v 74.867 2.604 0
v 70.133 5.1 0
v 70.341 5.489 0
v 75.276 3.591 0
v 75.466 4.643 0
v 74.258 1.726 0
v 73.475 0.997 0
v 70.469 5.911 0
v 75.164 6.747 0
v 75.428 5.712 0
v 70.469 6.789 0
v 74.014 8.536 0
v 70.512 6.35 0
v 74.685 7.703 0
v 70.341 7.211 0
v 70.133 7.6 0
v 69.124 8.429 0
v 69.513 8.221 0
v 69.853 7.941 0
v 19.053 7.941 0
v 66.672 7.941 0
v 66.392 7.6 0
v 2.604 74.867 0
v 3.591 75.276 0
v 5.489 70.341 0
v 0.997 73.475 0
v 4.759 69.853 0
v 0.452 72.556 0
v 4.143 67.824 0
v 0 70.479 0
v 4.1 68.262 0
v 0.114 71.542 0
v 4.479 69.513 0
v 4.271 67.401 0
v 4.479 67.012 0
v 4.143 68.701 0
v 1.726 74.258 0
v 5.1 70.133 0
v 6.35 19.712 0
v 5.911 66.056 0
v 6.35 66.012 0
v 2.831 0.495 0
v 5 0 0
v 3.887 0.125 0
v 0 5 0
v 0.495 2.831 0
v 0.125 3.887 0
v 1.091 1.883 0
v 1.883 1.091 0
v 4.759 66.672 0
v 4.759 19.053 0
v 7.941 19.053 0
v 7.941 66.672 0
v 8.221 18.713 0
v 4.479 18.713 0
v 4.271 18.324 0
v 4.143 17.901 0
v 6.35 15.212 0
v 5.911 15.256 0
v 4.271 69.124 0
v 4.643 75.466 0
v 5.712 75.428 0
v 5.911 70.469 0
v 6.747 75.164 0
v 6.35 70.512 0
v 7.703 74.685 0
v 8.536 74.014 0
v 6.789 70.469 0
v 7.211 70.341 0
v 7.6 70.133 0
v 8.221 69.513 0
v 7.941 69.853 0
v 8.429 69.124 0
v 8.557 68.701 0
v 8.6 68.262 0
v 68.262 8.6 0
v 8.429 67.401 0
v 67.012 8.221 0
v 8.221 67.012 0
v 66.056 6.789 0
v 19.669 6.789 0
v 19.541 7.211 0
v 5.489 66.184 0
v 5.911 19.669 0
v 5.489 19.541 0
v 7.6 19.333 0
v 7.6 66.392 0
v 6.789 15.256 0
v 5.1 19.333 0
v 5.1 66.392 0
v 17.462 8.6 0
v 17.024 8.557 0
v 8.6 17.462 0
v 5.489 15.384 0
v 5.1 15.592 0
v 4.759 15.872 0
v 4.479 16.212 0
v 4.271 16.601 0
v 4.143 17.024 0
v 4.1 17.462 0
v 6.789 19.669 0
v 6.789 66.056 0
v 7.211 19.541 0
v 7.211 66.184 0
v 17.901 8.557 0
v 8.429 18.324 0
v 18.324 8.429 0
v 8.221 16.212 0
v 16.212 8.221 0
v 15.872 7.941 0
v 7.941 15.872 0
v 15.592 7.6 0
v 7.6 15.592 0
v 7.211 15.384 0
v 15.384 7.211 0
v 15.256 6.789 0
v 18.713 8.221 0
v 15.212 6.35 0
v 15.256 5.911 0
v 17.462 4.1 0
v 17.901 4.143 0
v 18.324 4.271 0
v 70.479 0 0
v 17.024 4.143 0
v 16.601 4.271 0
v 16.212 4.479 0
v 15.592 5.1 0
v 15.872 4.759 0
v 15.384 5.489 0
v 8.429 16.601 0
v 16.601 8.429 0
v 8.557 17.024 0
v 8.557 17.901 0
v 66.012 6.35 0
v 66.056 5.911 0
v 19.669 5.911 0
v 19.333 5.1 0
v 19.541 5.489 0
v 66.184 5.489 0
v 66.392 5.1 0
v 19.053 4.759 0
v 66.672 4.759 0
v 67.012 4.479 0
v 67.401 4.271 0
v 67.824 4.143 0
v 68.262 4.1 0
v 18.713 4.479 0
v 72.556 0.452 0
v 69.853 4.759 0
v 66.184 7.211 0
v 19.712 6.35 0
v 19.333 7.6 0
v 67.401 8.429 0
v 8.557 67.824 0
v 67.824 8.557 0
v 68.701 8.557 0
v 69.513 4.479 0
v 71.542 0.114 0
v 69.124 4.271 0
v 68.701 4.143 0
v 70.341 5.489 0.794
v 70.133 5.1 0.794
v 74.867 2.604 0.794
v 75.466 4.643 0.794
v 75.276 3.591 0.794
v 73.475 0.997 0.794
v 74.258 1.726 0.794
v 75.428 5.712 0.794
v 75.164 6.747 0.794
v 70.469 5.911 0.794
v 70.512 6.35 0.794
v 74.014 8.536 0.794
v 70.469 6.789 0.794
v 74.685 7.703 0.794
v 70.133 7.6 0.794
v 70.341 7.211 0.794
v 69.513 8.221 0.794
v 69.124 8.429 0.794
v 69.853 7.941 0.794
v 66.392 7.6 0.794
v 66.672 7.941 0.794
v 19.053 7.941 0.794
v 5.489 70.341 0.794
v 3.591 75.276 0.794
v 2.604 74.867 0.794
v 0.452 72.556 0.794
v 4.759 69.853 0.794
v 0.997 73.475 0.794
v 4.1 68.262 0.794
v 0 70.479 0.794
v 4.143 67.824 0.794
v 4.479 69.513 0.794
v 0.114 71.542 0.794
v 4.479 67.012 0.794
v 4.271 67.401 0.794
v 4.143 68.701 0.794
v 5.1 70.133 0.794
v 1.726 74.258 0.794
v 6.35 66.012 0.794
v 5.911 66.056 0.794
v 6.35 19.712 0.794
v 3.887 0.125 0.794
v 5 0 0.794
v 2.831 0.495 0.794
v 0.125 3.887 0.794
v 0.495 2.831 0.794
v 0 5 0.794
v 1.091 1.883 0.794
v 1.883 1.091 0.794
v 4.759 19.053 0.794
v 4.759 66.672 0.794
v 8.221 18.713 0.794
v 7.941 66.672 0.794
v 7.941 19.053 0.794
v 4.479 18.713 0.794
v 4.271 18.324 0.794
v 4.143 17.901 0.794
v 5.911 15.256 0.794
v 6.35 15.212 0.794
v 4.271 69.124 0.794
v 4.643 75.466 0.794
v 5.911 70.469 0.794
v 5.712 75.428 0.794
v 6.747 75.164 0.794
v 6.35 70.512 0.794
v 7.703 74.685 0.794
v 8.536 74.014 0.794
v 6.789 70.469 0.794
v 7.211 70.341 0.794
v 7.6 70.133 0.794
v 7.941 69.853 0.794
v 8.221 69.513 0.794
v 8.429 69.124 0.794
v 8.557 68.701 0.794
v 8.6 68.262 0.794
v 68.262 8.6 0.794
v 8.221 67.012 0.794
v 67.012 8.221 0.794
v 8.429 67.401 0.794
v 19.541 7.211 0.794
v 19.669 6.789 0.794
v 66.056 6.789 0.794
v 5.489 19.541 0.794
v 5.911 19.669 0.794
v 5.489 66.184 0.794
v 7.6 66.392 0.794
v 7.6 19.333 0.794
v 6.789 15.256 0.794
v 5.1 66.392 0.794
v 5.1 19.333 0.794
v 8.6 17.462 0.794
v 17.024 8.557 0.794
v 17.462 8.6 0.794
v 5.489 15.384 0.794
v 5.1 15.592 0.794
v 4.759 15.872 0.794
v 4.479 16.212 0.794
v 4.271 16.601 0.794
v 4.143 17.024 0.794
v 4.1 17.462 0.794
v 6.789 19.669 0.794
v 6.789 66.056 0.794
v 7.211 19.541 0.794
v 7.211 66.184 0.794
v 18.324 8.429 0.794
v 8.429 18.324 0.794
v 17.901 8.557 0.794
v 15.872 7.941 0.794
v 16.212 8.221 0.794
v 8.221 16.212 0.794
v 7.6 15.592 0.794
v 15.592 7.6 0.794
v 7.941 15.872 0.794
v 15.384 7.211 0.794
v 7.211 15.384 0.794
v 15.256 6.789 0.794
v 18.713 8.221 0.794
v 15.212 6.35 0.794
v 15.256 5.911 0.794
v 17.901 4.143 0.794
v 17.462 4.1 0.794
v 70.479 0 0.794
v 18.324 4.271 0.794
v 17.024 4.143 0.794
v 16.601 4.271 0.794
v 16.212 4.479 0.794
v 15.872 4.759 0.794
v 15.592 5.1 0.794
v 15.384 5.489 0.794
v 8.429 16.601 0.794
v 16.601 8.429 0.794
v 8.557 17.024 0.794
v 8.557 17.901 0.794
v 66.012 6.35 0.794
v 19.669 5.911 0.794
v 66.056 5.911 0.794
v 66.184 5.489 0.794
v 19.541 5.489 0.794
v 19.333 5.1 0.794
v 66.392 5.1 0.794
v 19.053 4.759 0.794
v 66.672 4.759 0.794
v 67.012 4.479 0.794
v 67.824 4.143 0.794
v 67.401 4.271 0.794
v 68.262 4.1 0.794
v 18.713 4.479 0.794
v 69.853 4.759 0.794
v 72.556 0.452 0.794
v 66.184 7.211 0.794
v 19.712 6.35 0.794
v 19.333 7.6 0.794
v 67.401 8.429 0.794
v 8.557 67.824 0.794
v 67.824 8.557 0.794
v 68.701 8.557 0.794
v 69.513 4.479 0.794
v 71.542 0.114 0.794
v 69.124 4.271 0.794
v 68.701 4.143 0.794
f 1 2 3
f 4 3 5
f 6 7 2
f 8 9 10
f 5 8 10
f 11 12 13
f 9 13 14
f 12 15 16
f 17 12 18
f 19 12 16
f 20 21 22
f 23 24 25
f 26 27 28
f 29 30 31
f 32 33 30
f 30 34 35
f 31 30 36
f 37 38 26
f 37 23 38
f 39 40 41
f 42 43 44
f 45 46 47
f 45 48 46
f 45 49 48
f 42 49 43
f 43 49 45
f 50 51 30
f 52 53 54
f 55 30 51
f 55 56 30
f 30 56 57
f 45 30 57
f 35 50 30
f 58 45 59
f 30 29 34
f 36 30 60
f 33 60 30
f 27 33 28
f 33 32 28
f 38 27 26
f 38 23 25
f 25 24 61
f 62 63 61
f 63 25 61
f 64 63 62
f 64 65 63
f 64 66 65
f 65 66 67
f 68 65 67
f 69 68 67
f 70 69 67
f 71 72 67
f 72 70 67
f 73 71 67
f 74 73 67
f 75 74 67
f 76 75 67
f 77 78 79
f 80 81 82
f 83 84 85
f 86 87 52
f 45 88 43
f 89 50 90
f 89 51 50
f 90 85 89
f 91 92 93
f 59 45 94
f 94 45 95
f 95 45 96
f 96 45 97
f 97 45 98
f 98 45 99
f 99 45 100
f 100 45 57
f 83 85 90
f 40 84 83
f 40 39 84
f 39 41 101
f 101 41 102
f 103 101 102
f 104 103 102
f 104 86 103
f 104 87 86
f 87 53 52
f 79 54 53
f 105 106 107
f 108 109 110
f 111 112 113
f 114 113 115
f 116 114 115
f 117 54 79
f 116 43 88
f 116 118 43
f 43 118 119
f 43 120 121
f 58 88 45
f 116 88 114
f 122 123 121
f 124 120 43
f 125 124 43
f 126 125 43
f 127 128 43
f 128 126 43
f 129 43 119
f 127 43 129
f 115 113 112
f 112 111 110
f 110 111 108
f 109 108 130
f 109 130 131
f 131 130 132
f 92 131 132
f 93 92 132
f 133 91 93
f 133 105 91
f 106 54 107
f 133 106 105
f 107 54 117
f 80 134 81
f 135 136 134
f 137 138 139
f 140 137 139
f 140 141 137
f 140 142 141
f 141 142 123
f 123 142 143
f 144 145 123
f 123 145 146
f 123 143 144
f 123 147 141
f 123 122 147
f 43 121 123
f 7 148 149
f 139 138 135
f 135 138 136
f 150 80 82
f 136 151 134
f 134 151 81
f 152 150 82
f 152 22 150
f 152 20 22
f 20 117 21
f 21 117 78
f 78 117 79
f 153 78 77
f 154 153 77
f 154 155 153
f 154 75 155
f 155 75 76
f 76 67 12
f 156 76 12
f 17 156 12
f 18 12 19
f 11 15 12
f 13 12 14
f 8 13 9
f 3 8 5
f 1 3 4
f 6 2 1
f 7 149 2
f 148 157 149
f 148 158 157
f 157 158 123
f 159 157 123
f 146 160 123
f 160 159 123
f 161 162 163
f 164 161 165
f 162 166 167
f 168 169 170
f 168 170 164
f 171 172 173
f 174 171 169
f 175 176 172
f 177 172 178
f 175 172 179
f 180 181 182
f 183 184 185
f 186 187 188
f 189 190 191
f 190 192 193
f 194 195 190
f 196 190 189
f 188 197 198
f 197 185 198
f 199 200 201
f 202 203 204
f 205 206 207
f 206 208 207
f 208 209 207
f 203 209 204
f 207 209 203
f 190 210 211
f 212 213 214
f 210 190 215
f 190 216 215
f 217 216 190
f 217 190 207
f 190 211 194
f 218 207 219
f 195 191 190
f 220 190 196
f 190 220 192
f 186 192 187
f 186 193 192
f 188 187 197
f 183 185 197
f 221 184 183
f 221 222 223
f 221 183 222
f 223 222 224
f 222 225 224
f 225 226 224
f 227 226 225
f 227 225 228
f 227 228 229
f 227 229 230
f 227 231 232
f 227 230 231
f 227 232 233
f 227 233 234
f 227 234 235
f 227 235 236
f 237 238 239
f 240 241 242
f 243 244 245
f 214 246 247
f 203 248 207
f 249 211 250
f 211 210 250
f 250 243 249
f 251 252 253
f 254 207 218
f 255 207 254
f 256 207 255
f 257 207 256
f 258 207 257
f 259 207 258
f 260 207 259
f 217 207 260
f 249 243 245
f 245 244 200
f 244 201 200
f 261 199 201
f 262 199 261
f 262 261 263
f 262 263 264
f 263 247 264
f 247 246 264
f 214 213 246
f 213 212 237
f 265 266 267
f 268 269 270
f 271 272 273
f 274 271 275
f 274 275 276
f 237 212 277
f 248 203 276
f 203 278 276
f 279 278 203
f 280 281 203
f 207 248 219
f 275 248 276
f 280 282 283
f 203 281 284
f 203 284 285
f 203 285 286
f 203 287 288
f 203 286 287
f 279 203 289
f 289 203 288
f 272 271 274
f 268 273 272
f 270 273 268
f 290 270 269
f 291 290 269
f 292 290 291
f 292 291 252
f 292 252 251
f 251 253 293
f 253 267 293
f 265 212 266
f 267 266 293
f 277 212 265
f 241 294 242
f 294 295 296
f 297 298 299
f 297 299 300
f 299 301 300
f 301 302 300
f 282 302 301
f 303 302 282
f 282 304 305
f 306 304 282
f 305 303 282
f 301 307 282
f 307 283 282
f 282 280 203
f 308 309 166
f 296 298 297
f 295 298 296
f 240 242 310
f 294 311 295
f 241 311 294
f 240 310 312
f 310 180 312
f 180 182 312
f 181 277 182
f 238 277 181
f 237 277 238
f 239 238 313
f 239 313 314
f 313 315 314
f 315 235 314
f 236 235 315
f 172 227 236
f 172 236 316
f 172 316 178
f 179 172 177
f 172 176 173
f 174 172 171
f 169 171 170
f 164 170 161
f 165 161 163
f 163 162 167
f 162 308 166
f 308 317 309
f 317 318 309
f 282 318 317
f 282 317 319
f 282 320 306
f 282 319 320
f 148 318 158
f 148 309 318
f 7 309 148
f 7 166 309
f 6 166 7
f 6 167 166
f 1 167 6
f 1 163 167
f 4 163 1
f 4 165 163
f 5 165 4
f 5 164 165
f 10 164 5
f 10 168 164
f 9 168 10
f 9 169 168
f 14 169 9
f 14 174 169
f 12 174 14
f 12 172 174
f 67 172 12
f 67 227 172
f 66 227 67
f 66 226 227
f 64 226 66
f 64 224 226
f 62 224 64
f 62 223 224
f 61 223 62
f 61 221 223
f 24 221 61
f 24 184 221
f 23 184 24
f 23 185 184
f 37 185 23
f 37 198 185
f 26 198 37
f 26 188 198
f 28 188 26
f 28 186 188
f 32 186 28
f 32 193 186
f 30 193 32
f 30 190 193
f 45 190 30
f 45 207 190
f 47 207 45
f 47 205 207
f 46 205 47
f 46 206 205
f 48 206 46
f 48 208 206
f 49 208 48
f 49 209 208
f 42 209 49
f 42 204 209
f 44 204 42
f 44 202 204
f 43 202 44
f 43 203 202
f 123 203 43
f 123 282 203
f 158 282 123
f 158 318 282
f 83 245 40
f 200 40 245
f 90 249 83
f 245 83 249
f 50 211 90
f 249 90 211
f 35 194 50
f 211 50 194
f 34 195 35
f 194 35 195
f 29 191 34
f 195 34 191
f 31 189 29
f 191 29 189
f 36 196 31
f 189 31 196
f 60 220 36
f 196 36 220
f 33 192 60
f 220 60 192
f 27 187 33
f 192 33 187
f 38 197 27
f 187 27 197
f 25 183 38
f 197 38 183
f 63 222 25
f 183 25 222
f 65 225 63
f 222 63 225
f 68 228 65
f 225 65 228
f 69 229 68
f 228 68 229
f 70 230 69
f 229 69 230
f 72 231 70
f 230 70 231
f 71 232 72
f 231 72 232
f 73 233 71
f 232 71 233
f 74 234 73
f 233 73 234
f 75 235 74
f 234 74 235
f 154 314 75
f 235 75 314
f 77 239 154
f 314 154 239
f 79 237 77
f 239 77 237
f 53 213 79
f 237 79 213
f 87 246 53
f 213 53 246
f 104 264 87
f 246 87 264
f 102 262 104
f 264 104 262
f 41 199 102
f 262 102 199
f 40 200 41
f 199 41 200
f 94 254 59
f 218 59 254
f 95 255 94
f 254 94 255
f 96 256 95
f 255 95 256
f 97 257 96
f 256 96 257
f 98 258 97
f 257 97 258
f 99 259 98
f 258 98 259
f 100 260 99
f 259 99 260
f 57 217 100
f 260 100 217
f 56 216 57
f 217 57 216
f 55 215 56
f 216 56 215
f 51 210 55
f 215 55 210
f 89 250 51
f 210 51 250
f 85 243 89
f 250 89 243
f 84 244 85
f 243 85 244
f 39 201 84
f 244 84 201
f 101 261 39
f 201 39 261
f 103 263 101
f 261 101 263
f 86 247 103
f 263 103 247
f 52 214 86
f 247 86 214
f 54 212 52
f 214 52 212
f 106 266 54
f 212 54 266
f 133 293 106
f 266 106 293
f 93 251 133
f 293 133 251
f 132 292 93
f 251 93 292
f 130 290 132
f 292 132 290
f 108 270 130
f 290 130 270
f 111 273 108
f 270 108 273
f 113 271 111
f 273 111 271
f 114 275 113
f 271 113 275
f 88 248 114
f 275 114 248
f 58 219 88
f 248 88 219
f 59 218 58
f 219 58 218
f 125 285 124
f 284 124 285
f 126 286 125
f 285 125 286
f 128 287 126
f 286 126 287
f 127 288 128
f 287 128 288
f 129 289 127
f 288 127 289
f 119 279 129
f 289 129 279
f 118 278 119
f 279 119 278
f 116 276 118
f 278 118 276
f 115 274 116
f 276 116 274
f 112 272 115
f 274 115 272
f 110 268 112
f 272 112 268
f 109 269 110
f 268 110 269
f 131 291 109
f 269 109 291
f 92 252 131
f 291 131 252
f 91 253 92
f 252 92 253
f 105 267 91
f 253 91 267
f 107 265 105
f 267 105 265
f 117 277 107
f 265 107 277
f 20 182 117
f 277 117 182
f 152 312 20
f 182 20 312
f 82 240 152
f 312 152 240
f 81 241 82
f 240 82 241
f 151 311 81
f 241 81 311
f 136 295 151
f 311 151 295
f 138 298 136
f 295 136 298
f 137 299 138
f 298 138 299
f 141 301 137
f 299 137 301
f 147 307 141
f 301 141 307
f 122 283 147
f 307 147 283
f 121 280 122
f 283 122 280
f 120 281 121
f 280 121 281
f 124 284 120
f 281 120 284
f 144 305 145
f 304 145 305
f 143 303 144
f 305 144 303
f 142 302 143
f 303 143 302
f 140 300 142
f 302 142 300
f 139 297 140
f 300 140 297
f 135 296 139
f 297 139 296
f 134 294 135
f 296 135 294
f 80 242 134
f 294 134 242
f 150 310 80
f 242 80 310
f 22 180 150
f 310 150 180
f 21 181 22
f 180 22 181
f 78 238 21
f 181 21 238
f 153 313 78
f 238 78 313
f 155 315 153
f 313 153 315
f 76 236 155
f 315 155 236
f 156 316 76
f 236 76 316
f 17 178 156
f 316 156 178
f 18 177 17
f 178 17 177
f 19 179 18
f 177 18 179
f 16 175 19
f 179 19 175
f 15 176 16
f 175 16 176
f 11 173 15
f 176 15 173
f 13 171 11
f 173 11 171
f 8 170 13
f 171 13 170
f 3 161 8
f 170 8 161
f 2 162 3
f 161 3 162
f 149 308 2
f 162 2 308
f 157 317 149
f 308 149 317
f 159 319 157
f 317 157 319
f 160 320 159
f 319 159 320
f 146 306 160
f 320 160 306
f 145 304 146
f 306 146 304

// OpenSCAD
// file: ../lib/TOGComplexLib1.scad
function tcplx1_multiply(a, b) =
	[a[0]*b[0] - a[1]*b[1], a[0]*b[1] + a[1]*b[0]];
function tcplx1_divide(a, b) =
	let(bot = (b[0]*b[0] + b[1]*b[1]))
	[
		(a[0]*b[0] + a[1]*b[1])/bot,
		(a[1]*b[0] - a[0]*b[1])/bot
	];

assert([-11,23] == tcplx1_multiply([3,2], [1,7]));

assert([-1,3] == tcplx1_multiply([3,1], [0,1]));
assert([-1,3] == tcplx1_multiply([0,1], [3,1]));

echo(tcplx1_divide([-1,3], [3,1]));
assert([0,1] == tcplx1_divide([-1,3], [3,1]));

function tcplx1_normalize(vec) =
	let(veclen = sqrt(vec[0]*vec[0]+vec[1]*vec[1]))
	[vec[0] / veclen, vec[1] / veclen];

function tcplx1_relative_turnvec_vv(v0, v1) =
	tcplx1_divide(tcplx1_normalize(v1), tcplx1_normalize(v0));

function tcplx1_relative_turnvec_abc(p0, p1, p2) = tcplx1_relative_turnvec_vv(p1-p0, p2-p1);

// A 90-degree turn
assert([0,1] == tcplx1_relative_turnvec_abc([0,0], [1,0], [1,1]));
assert([0,1] == tcplx1_relative_turnvec_abc([0,0], [0,1], [-1,1]));

// A 45-degree turn
assert(tcplx1_normalize([1,1]) == tcplx1_relative_turnvec_abc([0,0], [1,0], [ 2,1]));
assert(tcplx1_normalize([1,1]) == tcplx1_relative_turnvec_abc([0,0], [0,1], [-1,2]));


function tcplx1_relative_angle_abc(p0, p1, p2) =
	let(turnvec = tcplx1_relative_turnvec_abc(p0, p1, p2))
	atan2(turnvec[1], turnvec[0]);

assert(-135 == tcplx1_relative_angle_abc([0,0], [1,0], [0,-1]));
assert( -90 == tcplx1_relative_angle_abc([0,0], [1,0], [1,-1]));
assert(   0 == tcplx1_relative_angle_abc([0,0], [1,0], [2, 0]));
assert(  90 == tcplx1_relative_angle_abc([0,0], [1,0], [1, 1]));
assert( 135 == tcplx1_relative_angle_abc([0,0], [1,0], [0, 1]));

assert(  90 == tcplx1_relative_angle_abc([1,1], [3,3], [1, 5]));
// file: ../lib/TOGArrayLib1.scad
// TOGArrayLib1.5
// 
// Functions for working with arrays.
// 
// v1.1:
// - tal1_reduce assert(is_list(items)) to prevent infinite recursion
//   when given undefined or other non-list values
// v1.1.1:
// - Fix tal1_uniq_remap_v2 to return "list-remap-result" as the
//   first element of the returned list
// v1.2:
// - Add tal1_replace_at function
// v1.3:
// - tal1_is_vec_of, tal1_is_vec_of_num
// v1.4:
// - tal1_assert_for_each, for when you want to assert something
//   about each of a list of items and get nice failure messages
// v1.5:
// - Add tal1_duplicate_reversed function, which may be
//   handy when generating symmetrical polygons and stuff.

/**
 * Make a list with the contents of list `a`,
 * but starting at offset `off`, replaced by the contents of list `b`.
 * len(result) = max(len(a), off+len(b))
 */
function tal1_replace_at(a, off, b, default_value=undef, default_value_function=undef) =
	assert(is_list(a))
	assert(is_list(b))
	let( _dvf = !is_undef(default_value_function) ? default_value_function : function(i) default_value )
[
	for( i=[0:1:min(off,len(a))-1] ) a[i],
	for( i=[len(a):1:off-1] ) _dvf(i),
	for( i=[off:1:off+len(b)-1] ) b[i-off],
	for( i=[off+len(b):1:len(a)-1] ) a[i],
];

// Simplest case
assert([] == tal1_replace_at([], 0, []));
// Second simplest cases
assert(["foo"] == tal1_replace_at(["foo"], 0, []));
assert(["foo"] == tal1_replace_at([], 0, ["foo"]));
// Replace one item
assert(["foo","quux","baz"] == tal1_replace_at(["foo","bar","baz"], 1, ["quux"]));
// Replace and extend
assert(["foo","quux","tuna","tina"] == tal1_replace_at(["foo","bar","baz"], 1, ["quux", "tuna", "tina"]));
// Add beyond end of `a`
assert(["foo","zzz","quux"] == tal1_replace_at(["foo"], 2, ["quux"], default_value="zzz"));
// Adding 'nothing' should still fill to that point with defaults
assert(["foo","zzz","zzz"] == tal1_replace_at(["foo"], 3, [], default_value="zzz"));


function tal1_reduce(start, items, func, offset=0) =
	assert(is_list(items))
	len(items) == offset ? start :
	tal1_reduce(func(start, items[offset]), items, func, offset+1);

function tal1_consecutive_duplicate_count(items) = tal1_reduce(
	[0, undef],
	items,
	function(z,item) [z[0] + (item == z[1] ? 1 : 0), item]
)[0];

assert(0 == tal1_consecutive_duplicate_count([]));
assert(0 == tal1_consecutive_duplicate_count([50]));
assert(1 == tal1_consecutive_duplicate_count([50,50]));
assert(0 == tal1_consecutive_duplicate_count([50,51,52,53]));
assert(1 == tal1_consecutive_duplicate_count([50,51,52,52]));
assert(3 == tal1_consecutive_duplicate_count([50,50,50,50]));

// Set test_size to arbirarily large values
// to ensure that OpenSCAD can handle heavy recursion
let(test_size=1000) assert(test_size/2 == tal1_consecutive_duplicate_count([for(i=[0:1:test_size-1]) floor(i/2)]));



function tal1_uniq_(items, off0, off1) =
	let(chunklen = off1-off0)
	chunklen == 0 ? [] :
	chunklen == 1 ? [items[off0]] :
	let(half=floor(chunklen/2))
	let(left  = tal1_uniq_(items, off0     , off0+half))
	let(right = tal1_uniq_(items, off0+half, off1     ))
	assert(len(left) > 0)
	assert(len(right) > 0)
	left[len(left)-1] == right[0] ? [each left, for(i=[1:1:len(right)-1]) right[i]] :
	[each left, each right];

/** Given a list of items, returns a new list with identical consecutive items merged */
function tal1_uniq(items) = tal1_uniq_(items, 0, len(items));

assert([] == tal1_uniq([]));
assert([123] == tal1_uniq([123]));
assert([55,0,1,2,3] == tal1_uniq([55,0,1,2,3]));
assert([55,0,1,2] == tal1_uniq([55,0,1,1,2]));
assert([55,0,1] == tal1_uniq([55,55,0,0,0,0,0,0,1,1,1,1]));
assert([55,0] == tal1_uniq([55,0,0,0,0,0,0,0]));



/**
 * Returns [new items, old index -> new index mapping].
 * No-op version.
 */
function tal1_uniq_remap_v1(items) =
	["list-remap-result", items, [for (vi=[0:1:len(items)-1]) vi]];

// [a, a, b, b, c, c]
//
// [a,    ...], []  -> [a],[0]
// [a, a, ...], [0] -> [a],[0,0]

assert([1,2,3] == [1,2,3]);

/**
 * Recursive version that will combine adjacent identical vertexes,
 * but will use the original items.
 */
function tal1_uniq_remap_v2(items, map=[]) =
	let(index = len(map))
	len(items) == index ? ["list-remap-result", items, map] :
	index == 0 ? tal1_uniq_remap_v2(items, [0]) :
	items[index] == items[map[index-1]] ? tal1_uniq_remap_v2(items, [for(vi=map) vi, map[index-1]]) :
	tal1_uniq_remap_v2(items, [for(vi=map) vi, index]);

assert(tal1_uniq_remap_v2([1,1,2,2,3,4]) == ["list-remap-result", [1,1,2,2,3,4], [0,0,2,2,4,5]]);


/**
 * Returns true if `vec` is a list of at least min_len items
 * and component_check(each item, even those beyond min_len) is true.
 */
function tal1_is_vec_of(vec, min_len=0, component_check=function(x) true) =
	assert(is_num(min_len) && min_len >= 0)
	assert(is_function(component_check))
	is_list(vec) && len(vec) >= min_len &&
	tal1_reduce(true, vec, function(prev,item) prev && component_check(item));

function tal1_is_vec_of_num(vec, min_len=0) = tal1_is_vec_of(vec, min_len, function(i) is_num(i));

assert( true == tal1_is_vec_of_num([1,2,3]));
assert( true == tal1_is_vec_of_num([]));
assert( true == tal1_is_vec_of_num([1,2,3], 3));
assert(false == tal1_is_vec_of_num([1,2], 3));
assert(false == tal1_is_vec_of_num([1,2,"spoon"], 3));
// Requirements are ambiguous when
// first min_len items are numbers, but there are non-numeric items afterwards,
// so let's error on the side of saying 'no, it's not a list of numbers';
// i.e. the item check and the min_len are independent.
assert(false == tal1_is_vec_of_num([1,2,3,"artichoke"], 3));


/**
 * Asserts that item_checker(each item in list, index of item)[0] is true.
 * Second element of item_checker return value is assertion message.
 * Returns the original list, in case that's useful to you.
 */
function tal1_assert_for_each(list, item_checker) =
	let( _ignored = [ for(i=[0:1:len(list)-1])
		let(q=item_checker(list[i],i))
		let(passed=is_bool(q) ? q : is_list(q) ? q[0] : assert(false, str(
			"tal1_assert_for_each: item_checker should return Bool|[Bool,String], but returned ",
			q, " for item at index ", i)))
		let(message=is_list(q) ? q[1] : undef)
		assert(passed, message)
		q
	])
	list;

// Callback can return a boolean...
assert([1,2,3] == tal1_assert_for_each([1,2,3], function(v,i) is_num(v)));
// ...or a [boolean, string]
assert([1,2,3] == tal1_assert_for_each([1,2,3], function(v,i) [is_num(v), "element be a num"]));

// [a, b, c] -> [a, b, c, rxf(c), rxf(b), rxf(a)]
function tal1_duplicate_reversed(list, rxf=function(item) item) =
	[
		each list,
		for( i=[len(list)-1 : -1 : 0] ) rxf(list[i]),
	];
// file: ../lib/TOGMod1Constructors.scad
// TOGMod1Constructors-v1.11
// 
// Functions to construct objects understood by TOGMod1
// 
// v1.1:
// - Add togmod1_make_rounded_rect
// v1.2:
// - togmod1_make_rounded_rect can make ovals
// v1.3:
// - togmod1_circle_points, to just get the points of a circle
// - if pos parameter to circle function has a third element,
//   returned vertexes will include it as the z component;
// v1.3.1
// - Some assertions
// v1.4:
// - Refactor togmod1_rounded_rect_points and togmod1_circle_points
//   to use togmod1__make_nd_vector_adder for adapting to whatever
//   `pos` parameter is.
// v1.5:
// - togmod_rounded_rect_points will not simplify completely rounded sides
//   (where length of side is exactly twice the rounding radius)
//   unless simplify_rounded_sides=true
//   - This makes it more useful for polyhedron generation,
//     where radius varies, but number of points must remain constant.
// v1.6:
// - togmod1_make_rect makes a simple rectangle
// - togmod1_make_rounded_rect will defer to togmod1_make_rect when r=0
// v1.7:
// - togmod1_make_circle will return empty shape (["union"]) when d=0
// v1.8:
// - Add togmod1_text
// v1.9:
// - togmod1_circle_points uses 3 as minimum circle point count instead of 6
// v1.10:
// - Fix togmod1_linear_extrude_y so that range corresponds to Y start/end and
//   polygon X,Y correspond to X,Z.  Previously it was rotated wrongly,
//   which would have gone unnoticed for symmetrical shapes centered at 0,0.
// v1.11:
// - Remove an 'echo'

use <./TOGArrayLib1.scad>

function togmod1__make_nd_vector_adder(origin=[0,0]) =
	let(origin_is_zero = tal1_reduce(true, origin, function(prev,item) prev && item == 0))
	origin_is_zero ? (function(vec) len(vec) >= len(origin) ? vec : tal1_replace_at(origin, 0, vec)) :
	function(vec) [
		for(i=[0:1:max(len(origin),len(vec))-1]) (len(vec) > i ? vec[i] : 0) + (len(origin) > i ? origin[i] : 0),
	];

assert([1,2,3] == togmod1__make_nd_vector_adder()([1,2,3]));
assert([1,2,3] == togmod1__make_nd_vector_adder([0,0,3])([1,2]));


function togmod1_make_cuboid(size) =
	assert(is_list(size))
	assert(len(size) >= 3)
	assert(is_num(size[0]))
	assert(is_num(size[1]))
	assert(is_num(size[2]))
	["polyhedron-vf", [
		[-size[0]/2, -size[1]/2, -size[2]/2],
		[+size[0]/2, -size[1]/2, -size[2]/2],
		[-size[0]/2, +size[1]/2, -size[2]/2],
		[+size[0]/2, +size[1]/2, -size[2]/2],
		[-size[0]/2, -size[1]/2, +size[2]/2],
		[+size[0]/2, -size[1]/2, +size[2]/2],
		[-size[0]/2, +size[1]/2, +size[2]/2],
		[+size[0]/2, +size[1]/2, +size[2]/2]
	], [
		[0,1,3,2],[0,4,5,1],[4,6,7,5],[3,7,6,2],[1,5,7,3],[6,4,0,2]
	]];

function togmod1_make_polygon(verts) =
	["polygon-vp", verts, [[for( i=[0:1:len(verts)-1] ) i%len(verts)]]];

function togmod1_rounded_rect_points(size, r, pos=[0,0], simplify_rounded_sides=false) =
	assert(is_list(size))
	assert(len(size) >= 2)
	let(radii = is_list(r) ? r : is_num(r) ? [r,r] : assert(false, "rounded_rect r(adius) should be list<num> or num"))
	let(rx = radii[0])
	let(ry = radii[1])
	assert(is_num(rx))
	assert(is_num(ry))
	assert(size[0] >= 2*rx, str("size[0] must be >= 2*r[0]; size[0] = ",size[0],", 2*r[0] = ",2*rx))
	assert(size[1] >= 2*ry, str("size[1] must be >= 2*r[1]; size[1] = ",size[1],", 2*r[1] = ",2*ry))
	let(quarterfn=max($fn/4, 1))
	let(qfnx = simplify_rounded_sides && size[0] == 2*rx ? quarterfn-1 : quarterfn)
	let(qfny = simplify_rounded_sides && size[1] == 2*ry ? quarterfn-1 : quarterfn)
	let(finalizepos = togmod1__make_nd_vector_adder(pos))
[
	for(a=[0 : 1 : qfnx]) let(ang=      a*90/quarterfn) finalizepos([ size[0]/2-rx + rx*cos(ang),  size[1]/2-ry + ry*sin(ang)]),
	for(a=[0 : 1 : qfny]) let(ang= 90 + a*90/quarterfn) finalizepos([-size[0]/2+rx + rx*cos(ang),  size[1]/2-ry + ry*sin(ang)]),
	for(a=[0 : 1 : qfnx]) let(ang=180 + a*90/quarterfn) finalizepos([-size[0]/2+rx + rx*cos(ang), -size[1]/2+ry + ry*sin(ang)]),
	for(a=[0 : 1 : qfny]) let(ang=270 + a*90/quarterfn) finalizepos([ size[0]/2-rx + rx*cos(ang), -size[1]/2+ry + ry*sin(ang)]),
];

function togmod1_make_rect(size) =
	togmod1_make_polygon([
		[-size[0]/2, -size[1]/2],
		[+size[0]/2, -size[1]/2],
		[+size[0]/2, +size[1]/2],
		[-size[0]/2, +size[1]/2],
	]);

function togmod1_make_rounded_rect(size, r) =
	r == 0 ? togmod1_make_rect(size) :
	togmod1_make_polygon(togmod1_rounded_rect_points(size,r,simplify_rounded_sides=true));

/**
 * Returns points for an approximation of a circle where points are at distance r from pos.
 * Can be used to make other regular polygons, but the faces will be less than that
 * distance from pos (do some trig if you want face distance, e.g. for a hex nut).
 */
function togmod1_circle_points(r, pos=[0,0], d=undef) =
	assert( !is_undef(r) || !is_undef(d) )
	assert(!is_undef(pos[0]))
	assert(!is_undef(pos[1]))
	let(finalizepos = togmod1__make_nd_vector_adder(pos))
	let(r_ = !is_undef(r) ? r : d/2)
	let(fn = max($fn, 3))
	[for(i=[0 : 1 : fn-1]) finalizepos([r_*cos(i*360/fn), r_*sin(i*360/fn)])];

function togmod1_make_circle(r, pos=[0,0], d=undef) =
	r == 0 || d == 0 ? ["union"] :
	togmod1_make_polygon(togmod1_circle_points(r=r, pos=pos, d=d));

function togmod1_make_cylinder(d, zrange=[0,1], r=undef, pos=[0,0]) =
	assert( !is_undef(r) || !is_undef(d) )
	let( r_ = !is_undef(r) ? r : d/2 )
	// TODO: Make polyhedron directly
	["linear-extrude-zs", zrange, togmod1_make_circle(r=r_, pos=pos)];

function togmod1__is_range1d(range) = is_list(range) && len(range) == 2 && is_num(range[0]) && is_num(range[1]);

function togmod1_linear_extrude_z(range, shape) =
	assert(togmod1__is_range1d(range))
	["linear-extrude-zs", range, shape];
function togmod1_linear_extrude_x(range, shape) =
	assert(togmod1__is_range1d(range))
	["rotate", [90, 0, 90], togmod1_linear_extrude_z(range, shape)];
function togmod1_linear_extrude_y(range, shape) =
	assert(togmod1__is_range1d(range))
	["rotate", [90, 0,  0], togmod1_linear_extrude_z([-range[1], -range[0]], shape)];

function togmod1_text(text, size, font, halign, valign, spacing, direction, language, script) =
	["text-tsfhvsdls", text, size, font, halign, valign, spacing, direction, language, script];
// file: ../lib/TOGMod1.scad
// TOGMod1.9
// OpenSCAD library for representing shapes
// 
// See also: Functional OpenSCAD (https://github.com/thehans/FunctionalOpenSCAD)
// 
// v1.8:
// - Add `text-tsfhvsdls`
// v1.9
// - Add `offset-ds` (offset with _d_elta a _s_hape)

module togmod1_domodule(mod) {
	assert(is_list(mod));
	assert(len(mod) > 0);
	if( mod[0] == "polygon-vp" ) {
		// ["polygon-vp", vertexes, paths]
		polygon(points=mod[1], paths=mod[2]);
	} else if( mod[0] == "polyhedron-vf" ) {
		polyhedron(mod[1], faces=mod[2]);
	} else if( mod[0] == "scale" ) {
		assert(len(mod) == 3);
		scale(mod[1]) togmod1_domodule(mod[2]);
	} else if( mod[0] == "translate" ) {
		assert(len(mod) == 3);
		assert(is_list(mod[1]));
		for(c=mod[1]) assert(is_num(c), "translate component should be numeric");
		translate(mod[1]) togmod1_domodule(mod[2]);
	} else if( mod[0] == "rotate" ) {
		assert(len(mod) == 3);
		rotate(mod[1]) togmod1_domodule(mod[2]);
	} else if( mod[0] == "intersection" ) {
		intersection_for( i=[1:1:len(mod)-1] ) togmod1_domodule(mod[i]);
	} else if( mod[0] == "difference" ) {
		difference() {
			togmod1_domodule(mod[1]);
			for( i=[2:1:len(mod)-1] ) togmod1_domodule(mod[i]);
		}
	} else if( mod[0] == "union" ) {
		for( i=[1:1:len(mod)-1] ) togmod1_domodule(mod[i]);
	} else if( mod[0] == "hull" ) {
		hull() for( i=[1:1:len(mod)-1] ) togmod1_domodule(mod[i]);
	} else if( mod[0] == "offset-rs" ) {
		assert(len(mod) == 3);
		assert(is_num(mod[1]));
		assert(is_list(mod[2]));
		offset(mod[1]) togmod1_domodule(mod[2]);
	} else if( mod[0] == "linear-extrude-zs" ) {
		// ["linear-extrude-zs", [z0,z1], 2d_shape] // centered
		// ["linear-extrude-zs", height, 2d_shape]
		let( zrange = is_list(mod[1]) ? mod[1] : [-mod[1]/2, mod[1]/2] ) {
			translate([0,0,zrange[0]]) linear_extrude(zrange[1]-zrange[0]) togmod1_domodule(mod[2]);
		}
	} else if( mod[0] == "render" ) {
		render() togmod1_domodule(mod[1]);
	} else if( mod[0] == "minkowski" ) {
		minkowski() {
			togmod1_domodule(mod[1]);
			togmod1_domodule(mod[2]);
		}
	} else if( mod[0] == "x-debug" ) {
		# togmod1_domodule(mod[1]);
	} else if( mod[0] == "x-color" ) {
		color(mod[1]) togmod1_domodule(mod[2]);
	} else if( mod[0] == "text-tsfhvsdls" ) {
		text(text=mod[1], size=mod[2], font=mod[3], halign=mod[4], valign=mod[5], spacing=mod[6], direction=mod[7], language=mod[7], script=mod[8]);
	} else if( mod[0] == "offset-ds" ) {
		assert(is_num(mod[1]));
		assert(is_list(mod[2]));
		offset(delta=mod[1]) togmod1_domodule(mod[2]);
	} else {
		assert(false, str("Unrecognized shape: ", mod[0]));
	}
}
// main file
// AlamengdaTriangle1.0
// 
// replacement triangle for https://www.amazon.com/dp/B0C59W6JKD

module __alamencase_triangle__end_params() { }

use <../lib/TOGMod1.scad>
use <../lib/TOGMod1Constructors.scad>
use <../lib/TOGPath1.scad>

inch = 25.4;

$fn = $preview ? 12 : 32;

panel_rath = let(leg=3.25*inch) let(rr = 5) ["togpath1-rath",
	["togpath1-rathnode", [  0,  0], ["round", rr]],
	["togpath1-rathnode", [leg,  0], ["round", rr]],
	["togpath1-rathnode", [0  ,leg], ["round", rr]],
];

panel_2d = togmod1_make_polygon(togpath1_rath_to_polypoints(panel_rath));
hole_2d = togmod1_make_circle(d=4.5);
holes_2d = let(y1=inch/4, x1=inch*11/16, x2=inch*(2+11/16))
	["union", for(pos=[[x1,y1], [x2,y1], [y1,x1], [y1,x2]]) ["translate", pos, hole_2d]];

togmod1_domodule(togmod1_linear_extrude_z([0, inch/32], ["difference", panel_2d, holes_2d]));
